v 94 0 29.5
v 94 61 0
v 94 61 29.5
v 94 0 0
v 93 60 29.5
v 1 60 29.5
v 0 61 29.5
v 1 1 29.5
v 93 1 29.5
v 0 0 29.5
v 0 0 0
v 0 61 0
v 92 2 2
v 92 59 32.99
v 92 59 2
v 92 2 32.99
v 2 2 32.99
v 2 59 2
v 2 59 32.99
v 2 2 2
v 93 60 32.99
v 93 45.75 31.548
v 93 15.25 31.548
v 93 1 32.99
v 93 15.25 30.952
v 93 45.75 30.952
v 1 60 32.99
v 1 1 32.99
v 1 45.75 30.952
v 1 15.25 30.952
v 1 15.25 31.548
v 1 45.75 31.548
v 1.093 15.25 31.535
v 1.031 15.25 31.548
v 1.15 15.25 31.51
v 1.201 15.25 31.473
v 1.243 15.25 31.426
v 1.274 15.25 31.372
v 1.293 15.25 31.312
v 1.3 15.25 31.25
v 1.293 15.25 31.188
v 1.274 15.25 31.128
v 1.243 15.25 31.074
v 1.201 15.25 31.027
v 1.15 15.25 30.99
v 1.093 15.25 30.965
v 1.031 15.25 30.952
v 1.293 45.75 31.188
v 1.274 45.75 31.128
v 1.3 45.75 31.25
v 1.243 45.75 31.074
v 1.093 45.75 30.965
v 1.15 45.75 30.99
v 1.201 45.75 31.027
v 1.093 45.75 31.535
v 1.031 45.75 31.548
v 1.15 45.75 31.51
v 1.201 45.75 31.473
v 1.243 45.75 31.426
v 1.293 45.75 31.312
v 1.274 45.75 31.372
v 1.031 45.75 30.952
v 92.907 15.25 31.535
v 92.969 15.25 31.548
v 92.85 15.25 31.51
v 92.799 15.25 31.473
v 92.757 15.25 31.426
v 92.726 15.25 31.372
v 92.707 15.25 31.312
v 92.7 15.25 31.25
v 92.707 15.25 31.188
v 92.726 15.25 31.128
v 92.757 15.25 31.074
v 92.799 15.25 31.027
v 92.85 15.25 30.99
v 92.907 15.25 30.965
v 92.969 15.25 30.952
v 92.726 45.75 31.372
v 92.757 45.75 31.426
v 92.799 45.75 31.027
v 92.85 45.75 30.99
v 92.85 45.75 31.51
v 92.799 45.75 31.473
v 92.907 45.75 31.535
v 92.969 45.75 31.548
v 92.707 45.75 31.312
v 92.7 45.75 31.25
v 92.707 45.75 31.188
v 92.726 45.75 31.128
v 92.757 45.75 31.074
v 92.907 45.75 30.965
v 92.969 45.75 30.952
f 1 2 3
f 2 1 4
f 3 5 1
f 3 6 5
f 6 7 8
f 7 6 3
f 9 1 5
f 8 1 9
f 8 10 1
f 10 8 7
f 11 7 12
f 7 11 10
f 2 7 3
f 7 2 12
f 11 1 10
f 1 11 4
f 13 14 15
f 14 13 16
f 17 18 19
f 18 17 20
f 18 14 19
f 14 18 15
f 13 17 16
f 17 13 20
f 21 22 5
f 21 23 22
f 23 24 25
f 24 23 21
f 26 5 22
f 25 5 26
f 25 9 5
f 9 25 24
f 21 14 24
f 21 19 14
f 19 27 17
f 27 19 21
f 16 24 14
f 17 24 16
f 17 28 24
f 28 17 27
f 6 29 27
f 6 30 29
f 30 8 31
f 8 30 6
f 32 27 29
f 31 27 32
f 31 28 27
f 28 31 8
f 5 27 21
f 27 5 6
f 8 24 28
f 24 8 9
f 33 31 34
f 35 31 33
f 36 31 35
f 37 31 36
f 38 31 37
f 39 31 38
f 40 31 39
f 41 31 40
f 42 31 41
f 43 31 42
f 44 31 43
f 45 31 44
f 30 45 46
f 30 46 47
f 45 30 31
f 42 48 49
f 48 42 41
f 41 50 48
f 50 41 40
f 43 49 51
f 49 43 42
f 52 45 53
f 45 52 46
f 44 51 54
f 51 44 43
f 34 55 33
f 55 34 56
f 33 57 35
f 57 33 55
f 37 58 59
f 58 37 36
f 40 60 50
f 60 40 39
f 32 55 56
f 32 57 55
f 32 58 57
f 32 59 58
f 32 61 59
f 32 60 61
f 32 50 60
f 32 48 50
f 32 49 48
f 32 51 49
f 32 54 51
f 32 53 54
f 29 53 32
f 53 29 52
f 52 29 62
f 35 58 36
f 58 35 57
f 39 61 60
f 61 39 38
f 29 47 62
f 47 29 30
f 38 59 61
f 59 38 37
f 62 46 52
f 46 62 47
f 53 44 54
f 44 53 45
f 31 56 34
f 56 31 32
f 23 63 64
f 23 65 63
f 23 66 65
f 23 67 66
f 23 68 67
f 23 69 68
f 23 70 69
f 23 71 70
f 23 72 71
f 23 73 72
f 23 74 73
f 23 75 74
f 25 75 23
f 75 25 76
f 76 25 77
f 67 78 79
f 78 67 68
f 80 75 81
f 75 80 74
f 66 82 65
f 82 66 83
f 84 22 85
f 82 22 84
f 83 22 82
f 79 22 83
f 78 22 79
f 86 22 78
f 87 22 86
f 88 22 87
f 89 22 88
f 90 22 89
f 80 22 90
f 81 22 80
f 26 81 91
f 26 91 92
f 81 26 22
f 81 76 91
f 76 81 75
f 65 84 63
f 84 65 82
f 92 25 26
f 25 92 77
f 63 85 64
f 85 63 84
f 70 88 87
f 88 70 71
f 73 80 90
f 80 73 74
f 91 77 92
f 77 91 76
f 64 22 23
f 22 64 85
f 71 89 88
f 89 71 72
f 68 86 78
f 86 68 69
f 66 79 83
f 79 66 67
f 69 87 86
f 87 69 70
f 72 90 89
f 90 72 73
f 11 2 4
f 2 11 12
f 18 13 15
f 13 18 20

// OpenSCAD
// 32 cards
//internalz     = 11; // internal overall z dimension
//internalx     = 90; // internal x dimension
//internaly     = 57; // internal y dimension

// 54 cards
//internalz     = 20; // internal overall z dimension
//internalx     = 90; // internal x dimension
//internaly     = 57; // internal y dimension

// tarot
//internalz     = 29; // internal overall z dimension
//internalx     = 114; // internal x dimension
//internaly     = 62.5; // internal y dimension

// uno
internalz     = 32; // internal overall z dimension
internalx     = 90; // internal x dimension
internaly     = 57; // internal y dimension

internal_lidz = 4.5; // this is taken of off the internalz for the bottom height and acts as the lid internal height
lip_overlap   = 3.5; // how much overlap between box and lid, this works as a default but can be shrunk as needed
wallthickness = 2; // this is the wall of the lip, the box is twice as thick





//#############################
// INTERNAL VARIABLES, DO NOT MODIFY
actual_lid_z = internal_lidz + wallthickness;
actual_y = internaly + 2*wallthickness;
actual_x = internalx + 2*wallthickness;
actual_z = internalz + 2*wallthickness;

echo(actual_lid_z);

module lock(h) {
  rotate([-90,0,0])
    cylinder(r = 0.3, h = h, $fn = 30);
}

module lid(printerMargin=0, h = actual_y/4) {
  union() {
    difference() {
      cube([actual_x, actual_y, actual_lid_z]);
      
      translate([wallthickness, wallthickness, -0.01])
        cube([internalx,internaly,internal_lidz]);

      translate([wallthickness/2-printerMargin, wallthickness/2-printerMargin, -0.01])
        cube([internalx+wallthickness+2*printerMargin, internaly+wallthickness+2*printerMargin, lip_overlap]);

      // Holes (we can see what's inside!)
      translate([wallthickness+internalx/2-internalx/1.5/2, wallthickness++internaly/2-internaly/1.5/2, wallthickness*2])
        cube([internalx/1.5,internaly/1.5,internal_lidz]);
    
    }

    // lock
    translate([wallthickness/2, actual_y/2-h/2, lip_overlap/2]) lock(h);
    translate([actual_x-wallthickness/2, actual_y/2-h/2, lip_overlap/2]) lock(h);

  }
}

module bottom() {
  difference() {
    cube([actual_x, actual_y, actual_z]);
    translate([wallthickness, wallthickness, wallthickness])
      cube([internalx, internaly, internalz+10]);
    translate([0,0,actual_z-actual_lid_z]) lid(h = actual_y/2); 
  }
}



bottom();
//translate([0,-10,actual_lid_z]) rotate([180,0,0]) lid(printerMargin=0.25);
